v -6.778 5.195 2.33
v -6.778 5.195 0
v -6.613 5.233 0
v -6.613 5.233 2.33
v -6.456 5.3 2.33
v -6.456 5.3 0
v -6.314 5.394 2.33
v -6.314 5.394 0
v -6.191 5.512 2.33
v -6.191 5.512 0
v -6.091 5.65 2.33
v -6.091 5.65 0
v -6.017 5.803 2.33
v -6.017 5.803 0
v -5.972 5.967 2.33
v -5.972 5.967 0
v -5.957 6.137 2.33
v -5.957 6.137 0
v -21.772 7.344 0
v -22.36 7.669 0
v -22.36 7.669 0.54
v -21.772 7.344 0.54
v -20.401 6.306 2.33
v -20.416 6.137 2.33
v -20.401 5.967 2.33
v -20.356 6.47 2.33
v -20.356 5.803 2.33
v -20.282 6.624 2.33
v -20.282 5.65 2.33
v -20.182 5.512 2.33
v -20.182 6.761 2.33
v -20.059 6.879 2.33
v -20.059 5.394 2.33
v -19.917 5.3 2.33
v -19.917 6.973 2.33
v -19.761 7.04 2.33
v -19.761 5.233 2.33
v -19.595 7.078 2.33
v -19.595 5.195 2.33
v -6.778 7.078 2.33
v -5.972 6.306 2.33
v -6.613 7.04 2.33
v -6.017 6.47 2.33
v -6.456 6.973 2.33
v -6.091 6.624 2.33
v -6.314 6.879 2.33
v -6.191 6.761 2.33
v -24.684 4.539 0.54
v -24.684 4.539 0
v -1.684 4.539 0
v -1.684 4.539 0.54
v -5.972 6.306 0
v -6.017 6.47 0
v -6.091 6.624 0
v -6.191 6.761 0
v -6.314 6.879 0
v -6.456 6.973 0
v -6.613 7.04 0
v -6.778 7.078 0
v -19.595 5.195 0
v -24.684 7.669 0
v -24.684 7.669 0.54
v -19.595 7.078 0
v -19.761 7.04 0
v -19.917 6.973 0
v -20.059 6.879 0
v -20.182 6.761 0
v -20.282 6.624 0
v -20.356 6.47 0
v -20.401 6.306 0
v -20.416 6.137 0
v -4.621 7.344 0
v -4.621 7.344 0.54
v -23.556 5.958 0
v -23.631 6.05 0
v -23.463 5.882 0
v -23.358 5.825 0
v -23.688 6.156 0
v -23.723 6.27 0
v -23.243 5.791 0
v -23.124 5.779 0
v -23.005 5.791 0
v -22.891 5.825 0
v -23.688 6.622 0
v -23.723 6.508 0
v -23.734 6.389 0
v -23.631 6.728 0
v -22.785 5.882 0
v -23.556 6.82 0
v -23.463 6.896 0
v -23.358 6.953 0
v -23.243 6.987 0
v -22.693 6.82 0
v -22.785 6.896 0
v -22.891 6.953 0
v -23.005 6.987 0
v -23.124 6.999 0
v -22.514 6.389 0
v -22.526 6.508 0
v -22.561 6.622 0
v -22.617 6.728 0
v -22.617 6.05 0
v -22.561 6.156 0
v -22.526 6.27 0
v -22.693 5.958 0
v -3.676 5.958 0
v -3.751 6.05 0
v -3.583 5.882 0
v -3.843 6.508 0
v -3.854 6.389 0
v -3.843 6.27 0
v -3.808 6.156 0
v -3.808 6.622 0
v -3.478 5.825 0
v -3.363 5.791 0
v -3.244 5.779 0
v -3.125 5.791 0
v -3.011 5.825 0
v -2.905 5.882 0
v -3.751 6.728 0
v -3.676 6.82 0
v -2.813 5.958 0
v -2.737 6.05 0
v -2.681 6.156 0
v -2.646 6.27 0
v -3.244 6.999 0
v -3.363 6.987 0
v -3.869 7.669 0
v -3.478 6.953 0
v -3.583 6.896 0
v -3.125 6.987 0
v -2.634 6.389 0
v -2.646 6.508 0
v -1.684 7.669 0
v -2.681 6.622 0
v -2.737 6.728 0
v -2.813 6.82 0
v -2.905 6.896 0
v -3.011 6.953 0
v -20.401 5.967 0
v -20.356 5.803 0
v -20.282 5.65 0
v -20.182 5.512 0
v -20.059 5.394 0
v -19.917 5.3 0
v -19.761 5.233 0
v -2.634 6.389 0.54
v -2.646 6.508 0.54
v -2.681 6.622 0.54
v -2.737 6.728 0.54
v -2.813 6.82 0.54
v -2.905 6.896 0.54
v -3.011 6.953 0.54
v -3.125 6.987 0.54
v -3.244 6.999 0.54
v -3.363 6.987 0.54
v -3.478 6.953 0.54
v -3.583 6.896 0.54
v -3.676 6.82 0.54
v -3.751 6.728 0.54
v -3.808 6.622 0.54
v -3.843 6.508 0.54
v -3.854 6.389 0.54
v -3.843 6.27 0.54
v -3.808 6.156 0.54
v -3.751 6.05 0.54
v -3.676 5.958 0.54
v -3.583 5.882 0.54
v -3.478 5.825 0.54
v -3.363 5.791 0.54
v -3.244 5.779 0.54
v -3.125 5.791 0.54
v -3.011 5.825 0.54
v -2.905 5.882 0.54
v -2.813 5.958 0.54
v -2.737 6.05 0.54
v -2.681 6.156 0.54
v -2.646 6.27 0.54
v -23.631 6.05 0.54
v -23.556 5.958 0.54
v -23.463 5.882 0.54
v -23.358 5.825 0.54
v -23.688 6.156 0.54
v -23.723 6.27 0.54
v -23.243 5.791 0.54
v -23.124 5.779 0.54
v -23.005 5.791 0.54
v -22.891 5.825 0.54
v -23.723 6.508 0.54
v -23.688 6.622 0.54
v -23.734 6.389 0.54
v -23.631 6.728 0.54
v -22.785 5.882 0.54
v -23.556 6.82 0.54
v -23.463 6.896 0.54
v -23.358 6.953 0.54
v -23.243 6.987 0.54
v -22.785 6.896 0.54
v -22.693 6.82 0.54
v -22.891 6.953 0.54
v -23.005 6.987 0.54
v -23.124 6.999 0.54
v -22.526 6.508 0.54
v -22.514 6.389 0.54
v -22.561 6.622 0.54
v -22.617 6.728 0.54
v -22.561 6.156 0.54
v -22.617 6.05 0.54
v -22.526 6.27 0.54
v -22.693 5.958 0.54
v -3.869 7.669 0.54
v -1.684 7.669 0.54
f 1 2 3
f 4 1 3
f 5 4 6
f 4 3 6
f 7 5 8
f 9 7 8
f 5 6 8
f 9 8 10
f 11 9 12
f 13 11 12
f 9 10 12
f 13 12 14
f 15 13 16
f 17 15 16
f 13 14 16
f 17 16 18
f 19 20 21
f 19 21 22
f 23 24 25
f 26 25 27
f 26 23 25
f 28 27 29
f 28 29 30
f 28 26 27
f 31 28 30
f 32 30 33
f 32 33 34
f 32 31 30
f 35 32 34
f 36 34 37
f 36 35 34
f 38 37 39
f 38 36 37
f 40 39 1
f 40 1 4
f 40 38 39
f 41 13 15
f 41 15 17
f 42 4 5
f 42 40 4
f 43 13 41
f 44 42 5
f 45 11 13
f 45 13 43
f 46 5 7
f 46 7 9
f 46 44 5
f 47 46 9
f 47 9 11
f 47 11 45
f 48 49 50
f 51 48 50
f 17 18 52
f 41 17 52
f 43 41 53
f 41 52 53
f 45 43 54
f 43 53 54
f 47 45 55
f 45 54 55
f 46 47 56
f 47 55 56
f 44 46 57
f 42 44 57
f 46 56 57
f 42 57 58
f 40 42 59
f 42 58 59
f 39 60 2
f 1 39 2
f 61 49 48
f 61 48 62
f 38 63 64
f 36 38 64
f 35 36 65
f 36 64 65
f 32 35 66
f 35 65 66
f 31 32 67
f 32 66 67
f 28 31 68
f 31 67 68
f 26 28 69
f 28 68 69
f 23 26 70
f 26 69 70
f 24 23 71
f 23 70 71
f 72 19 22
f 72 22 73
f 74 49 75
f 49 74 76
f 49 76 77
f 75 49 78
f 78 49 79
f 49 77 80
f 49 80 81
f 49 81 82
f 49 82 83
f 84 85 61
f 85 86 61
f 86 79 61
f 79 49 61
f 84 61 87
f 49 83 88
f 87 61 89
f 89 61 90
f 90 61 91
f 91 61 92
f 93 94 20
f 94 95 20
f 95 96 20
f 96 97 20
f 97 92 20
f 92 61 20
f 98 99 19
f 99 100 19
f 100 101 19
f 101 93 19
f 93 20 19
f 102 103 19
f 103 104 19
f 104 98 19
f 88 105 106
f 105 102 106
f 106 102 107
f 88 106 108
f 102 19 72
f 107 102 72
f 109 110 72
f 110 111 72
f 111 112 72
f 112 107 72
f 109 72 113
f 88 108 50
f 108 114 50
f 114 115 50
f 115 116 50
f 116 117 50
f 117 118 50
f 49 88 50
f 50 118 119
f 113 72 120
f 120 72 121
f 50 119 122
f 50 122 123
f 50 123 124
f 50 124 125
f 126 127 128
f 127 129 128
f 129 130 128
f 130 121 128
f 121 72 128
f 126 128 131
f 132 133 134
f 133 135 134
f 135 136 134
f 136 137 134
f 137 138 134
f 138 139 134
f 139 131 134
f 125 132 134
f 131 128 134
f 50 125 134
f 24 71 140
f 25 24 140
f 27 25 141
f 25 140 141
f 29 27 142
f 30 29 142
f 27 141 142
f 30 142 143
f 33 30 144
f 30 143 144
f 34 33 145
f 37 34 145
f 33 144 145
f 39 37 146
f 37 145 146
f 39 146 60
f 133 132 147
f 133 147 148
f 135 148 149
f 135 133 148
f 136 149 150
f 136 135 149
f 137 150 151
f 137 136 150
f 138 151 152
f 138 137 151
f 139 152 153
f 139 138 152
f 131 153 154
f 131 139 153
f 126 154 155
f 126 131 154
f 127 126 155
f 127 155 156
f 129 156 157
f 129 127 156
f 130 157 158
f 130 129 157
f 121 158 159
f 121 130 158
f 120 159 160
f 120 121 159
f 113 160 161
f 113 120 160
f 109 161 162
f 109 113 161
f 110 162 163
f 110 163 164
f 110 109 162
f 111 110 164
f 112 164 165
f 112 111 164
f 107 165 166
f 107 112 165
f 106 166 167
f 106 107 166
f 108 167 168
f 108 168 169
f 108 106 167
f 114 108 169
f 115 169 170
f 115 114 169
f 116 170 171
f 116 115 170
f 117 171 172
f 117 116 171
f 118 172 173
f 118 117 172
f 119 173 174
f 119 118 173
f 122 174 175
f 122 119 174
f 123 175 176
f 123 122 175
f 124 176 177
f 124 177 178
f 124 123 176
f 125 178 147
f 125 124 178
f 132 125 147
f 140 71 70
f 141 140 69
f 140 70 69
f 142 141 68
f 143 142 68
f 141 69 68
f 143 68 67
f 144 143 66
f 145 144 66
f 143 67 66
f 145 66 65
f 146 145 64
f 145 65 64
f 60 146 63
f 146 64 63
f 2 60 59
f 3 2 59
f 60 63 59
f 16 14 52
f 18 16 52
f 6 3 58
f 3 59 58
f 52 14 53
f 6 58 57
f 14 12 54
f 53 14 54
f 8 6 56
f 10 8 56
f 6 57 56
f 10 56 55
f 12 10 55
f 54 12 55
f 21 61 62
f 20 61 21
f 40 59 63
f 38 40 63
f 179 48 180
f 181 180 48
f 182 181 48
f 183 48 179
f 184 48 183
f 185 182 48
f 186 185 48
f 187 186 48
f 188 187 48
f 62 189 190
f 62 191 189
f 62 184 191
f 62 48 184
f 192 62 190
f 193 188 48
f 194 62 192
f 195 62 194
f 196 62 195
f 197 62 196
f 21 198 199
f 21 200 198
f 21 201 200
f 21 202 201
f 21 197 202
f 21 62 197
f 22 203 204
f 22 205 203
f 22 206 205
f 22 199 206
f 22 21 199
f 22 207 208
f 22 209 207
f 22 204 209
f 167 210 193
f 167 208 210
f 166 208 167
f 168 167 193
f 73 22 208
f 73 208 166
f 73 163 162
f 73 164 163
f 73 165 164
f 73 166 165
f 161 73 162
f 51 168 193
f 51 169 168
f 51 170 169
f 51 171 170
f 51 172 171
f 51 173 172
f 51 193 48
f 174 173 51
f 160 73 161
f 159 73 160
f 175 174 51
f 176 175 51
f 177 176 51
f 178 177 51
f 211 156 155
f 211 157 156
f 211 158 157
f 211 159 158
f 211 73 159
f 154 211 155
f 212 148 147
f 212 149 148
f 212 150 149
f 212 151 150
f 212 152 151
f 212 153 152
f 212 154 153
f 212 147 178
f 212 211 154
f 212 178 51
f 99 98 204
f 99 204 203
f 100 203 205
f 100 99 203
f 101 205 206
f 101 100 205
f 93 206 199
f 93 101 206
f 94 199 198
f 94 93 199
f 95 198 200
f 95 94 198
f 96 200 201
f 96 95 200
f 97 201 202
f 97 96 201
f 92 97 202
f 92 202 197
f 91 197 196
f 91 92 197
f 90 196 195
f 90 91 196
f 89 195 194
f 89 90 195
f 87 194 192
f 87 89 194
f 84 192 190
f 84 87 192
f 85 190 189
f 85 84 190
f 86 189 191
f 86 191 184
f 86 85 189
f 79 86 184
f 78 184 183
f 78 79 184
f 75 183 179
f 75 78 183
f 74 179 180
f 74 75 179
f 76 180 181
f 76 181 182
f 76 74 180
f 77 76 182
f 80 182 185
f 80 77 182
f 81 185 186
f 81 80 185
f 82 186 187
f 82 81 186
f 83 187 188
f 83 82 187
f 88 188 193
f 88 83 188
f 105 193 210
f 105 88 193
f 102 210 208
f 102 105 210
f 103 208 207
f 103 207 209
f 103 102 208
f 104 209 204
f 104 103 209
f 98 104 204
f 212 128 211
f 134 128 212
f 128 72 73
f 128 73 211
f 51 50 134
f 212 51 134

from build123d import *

# Parameters (mm, degrees)
F0_W     = 23
F0_H     = 3.13
F2_DEPTH = 0.54
F1_R     = 0.61
F3_DEPTH = 0.54
F5_DEPTH = 2.33
F7_DEPTH = 25


# Not quite as in the source:
# - a feature names something its author has since deleted; it is built from what else it names


with BuildPart() as f2:
    # F0 (on Top) → F2 (new body)
    with BuildSketch(Plane.XY):
        with Locations((-13.1842952464, 6.1040417799)):
            Rectangle(F0_W, F0_H)
    extrude(amount=F2_DEPTH)

    # F1 (on Top) → F3 (cut)
    with BuildSketch(Plane.XY):
        with Locations((-23.1242952464, 6.3890417799)):
            Circle(F1_R)
        with Locations((-3.2442952464, 6.3890417799)):
            Circle(F1_R)
    extrude(amount=F3_DEPTH, mode=Mode.SUBTRACT)

    # F6 (on Top) → F7 (cut)
    with BuildSketch(Plane.XY):
        Polygon((-3.7328053731, 8.1115094945), (-22.4673096091, 8.1115094945), (-22.4673096091, 7.7279869001), (-21.7720177025, 7.3444643058), (-4.6212589368, 7.3444643058), (-3.7328053731, 7.7279869001), align=None)
    extrude(amount=F7_DEPTH, mode=Mode.SUBTRACT)


with BuildPart() as f5:
    # F4 (on Top) → F5 (new body)
    with BuildSketch(Plane.XY):
        with BuildLine():
            ThreePointArc((-20.4164541145, 6.1365935627), (-20.1821228313, 5.5118830758), (-19.5947457105, 5.1953985412))
            Line((-19.5947457105, 5.1953985412), (-6.7784807016, 5.1953985412))
            ThreePointArc((-6.7784807016, 5.1953985412), (-6.1911035808, 5.5118830758), (-5.9567722976, 6.1365935627))
            ThreePointArc((-5.9567722976, 6.1365935627), (-6.1911035808, 6.7613040496), (-6.7784807016, 7.0777885842))
            Line((-6.7784807016, 7.0777885842), (-19.5947457105, 7.0777885842))
            ThreePointArc((-19.5947457105, 7.0777885842), (-20.1821228313, 6.7613040496), (-20.4164541145, 6.1365935627))
        make_face()
    extrude(amount=F5_DEPTH)


solid = Compound([f2.part, f5.part])
